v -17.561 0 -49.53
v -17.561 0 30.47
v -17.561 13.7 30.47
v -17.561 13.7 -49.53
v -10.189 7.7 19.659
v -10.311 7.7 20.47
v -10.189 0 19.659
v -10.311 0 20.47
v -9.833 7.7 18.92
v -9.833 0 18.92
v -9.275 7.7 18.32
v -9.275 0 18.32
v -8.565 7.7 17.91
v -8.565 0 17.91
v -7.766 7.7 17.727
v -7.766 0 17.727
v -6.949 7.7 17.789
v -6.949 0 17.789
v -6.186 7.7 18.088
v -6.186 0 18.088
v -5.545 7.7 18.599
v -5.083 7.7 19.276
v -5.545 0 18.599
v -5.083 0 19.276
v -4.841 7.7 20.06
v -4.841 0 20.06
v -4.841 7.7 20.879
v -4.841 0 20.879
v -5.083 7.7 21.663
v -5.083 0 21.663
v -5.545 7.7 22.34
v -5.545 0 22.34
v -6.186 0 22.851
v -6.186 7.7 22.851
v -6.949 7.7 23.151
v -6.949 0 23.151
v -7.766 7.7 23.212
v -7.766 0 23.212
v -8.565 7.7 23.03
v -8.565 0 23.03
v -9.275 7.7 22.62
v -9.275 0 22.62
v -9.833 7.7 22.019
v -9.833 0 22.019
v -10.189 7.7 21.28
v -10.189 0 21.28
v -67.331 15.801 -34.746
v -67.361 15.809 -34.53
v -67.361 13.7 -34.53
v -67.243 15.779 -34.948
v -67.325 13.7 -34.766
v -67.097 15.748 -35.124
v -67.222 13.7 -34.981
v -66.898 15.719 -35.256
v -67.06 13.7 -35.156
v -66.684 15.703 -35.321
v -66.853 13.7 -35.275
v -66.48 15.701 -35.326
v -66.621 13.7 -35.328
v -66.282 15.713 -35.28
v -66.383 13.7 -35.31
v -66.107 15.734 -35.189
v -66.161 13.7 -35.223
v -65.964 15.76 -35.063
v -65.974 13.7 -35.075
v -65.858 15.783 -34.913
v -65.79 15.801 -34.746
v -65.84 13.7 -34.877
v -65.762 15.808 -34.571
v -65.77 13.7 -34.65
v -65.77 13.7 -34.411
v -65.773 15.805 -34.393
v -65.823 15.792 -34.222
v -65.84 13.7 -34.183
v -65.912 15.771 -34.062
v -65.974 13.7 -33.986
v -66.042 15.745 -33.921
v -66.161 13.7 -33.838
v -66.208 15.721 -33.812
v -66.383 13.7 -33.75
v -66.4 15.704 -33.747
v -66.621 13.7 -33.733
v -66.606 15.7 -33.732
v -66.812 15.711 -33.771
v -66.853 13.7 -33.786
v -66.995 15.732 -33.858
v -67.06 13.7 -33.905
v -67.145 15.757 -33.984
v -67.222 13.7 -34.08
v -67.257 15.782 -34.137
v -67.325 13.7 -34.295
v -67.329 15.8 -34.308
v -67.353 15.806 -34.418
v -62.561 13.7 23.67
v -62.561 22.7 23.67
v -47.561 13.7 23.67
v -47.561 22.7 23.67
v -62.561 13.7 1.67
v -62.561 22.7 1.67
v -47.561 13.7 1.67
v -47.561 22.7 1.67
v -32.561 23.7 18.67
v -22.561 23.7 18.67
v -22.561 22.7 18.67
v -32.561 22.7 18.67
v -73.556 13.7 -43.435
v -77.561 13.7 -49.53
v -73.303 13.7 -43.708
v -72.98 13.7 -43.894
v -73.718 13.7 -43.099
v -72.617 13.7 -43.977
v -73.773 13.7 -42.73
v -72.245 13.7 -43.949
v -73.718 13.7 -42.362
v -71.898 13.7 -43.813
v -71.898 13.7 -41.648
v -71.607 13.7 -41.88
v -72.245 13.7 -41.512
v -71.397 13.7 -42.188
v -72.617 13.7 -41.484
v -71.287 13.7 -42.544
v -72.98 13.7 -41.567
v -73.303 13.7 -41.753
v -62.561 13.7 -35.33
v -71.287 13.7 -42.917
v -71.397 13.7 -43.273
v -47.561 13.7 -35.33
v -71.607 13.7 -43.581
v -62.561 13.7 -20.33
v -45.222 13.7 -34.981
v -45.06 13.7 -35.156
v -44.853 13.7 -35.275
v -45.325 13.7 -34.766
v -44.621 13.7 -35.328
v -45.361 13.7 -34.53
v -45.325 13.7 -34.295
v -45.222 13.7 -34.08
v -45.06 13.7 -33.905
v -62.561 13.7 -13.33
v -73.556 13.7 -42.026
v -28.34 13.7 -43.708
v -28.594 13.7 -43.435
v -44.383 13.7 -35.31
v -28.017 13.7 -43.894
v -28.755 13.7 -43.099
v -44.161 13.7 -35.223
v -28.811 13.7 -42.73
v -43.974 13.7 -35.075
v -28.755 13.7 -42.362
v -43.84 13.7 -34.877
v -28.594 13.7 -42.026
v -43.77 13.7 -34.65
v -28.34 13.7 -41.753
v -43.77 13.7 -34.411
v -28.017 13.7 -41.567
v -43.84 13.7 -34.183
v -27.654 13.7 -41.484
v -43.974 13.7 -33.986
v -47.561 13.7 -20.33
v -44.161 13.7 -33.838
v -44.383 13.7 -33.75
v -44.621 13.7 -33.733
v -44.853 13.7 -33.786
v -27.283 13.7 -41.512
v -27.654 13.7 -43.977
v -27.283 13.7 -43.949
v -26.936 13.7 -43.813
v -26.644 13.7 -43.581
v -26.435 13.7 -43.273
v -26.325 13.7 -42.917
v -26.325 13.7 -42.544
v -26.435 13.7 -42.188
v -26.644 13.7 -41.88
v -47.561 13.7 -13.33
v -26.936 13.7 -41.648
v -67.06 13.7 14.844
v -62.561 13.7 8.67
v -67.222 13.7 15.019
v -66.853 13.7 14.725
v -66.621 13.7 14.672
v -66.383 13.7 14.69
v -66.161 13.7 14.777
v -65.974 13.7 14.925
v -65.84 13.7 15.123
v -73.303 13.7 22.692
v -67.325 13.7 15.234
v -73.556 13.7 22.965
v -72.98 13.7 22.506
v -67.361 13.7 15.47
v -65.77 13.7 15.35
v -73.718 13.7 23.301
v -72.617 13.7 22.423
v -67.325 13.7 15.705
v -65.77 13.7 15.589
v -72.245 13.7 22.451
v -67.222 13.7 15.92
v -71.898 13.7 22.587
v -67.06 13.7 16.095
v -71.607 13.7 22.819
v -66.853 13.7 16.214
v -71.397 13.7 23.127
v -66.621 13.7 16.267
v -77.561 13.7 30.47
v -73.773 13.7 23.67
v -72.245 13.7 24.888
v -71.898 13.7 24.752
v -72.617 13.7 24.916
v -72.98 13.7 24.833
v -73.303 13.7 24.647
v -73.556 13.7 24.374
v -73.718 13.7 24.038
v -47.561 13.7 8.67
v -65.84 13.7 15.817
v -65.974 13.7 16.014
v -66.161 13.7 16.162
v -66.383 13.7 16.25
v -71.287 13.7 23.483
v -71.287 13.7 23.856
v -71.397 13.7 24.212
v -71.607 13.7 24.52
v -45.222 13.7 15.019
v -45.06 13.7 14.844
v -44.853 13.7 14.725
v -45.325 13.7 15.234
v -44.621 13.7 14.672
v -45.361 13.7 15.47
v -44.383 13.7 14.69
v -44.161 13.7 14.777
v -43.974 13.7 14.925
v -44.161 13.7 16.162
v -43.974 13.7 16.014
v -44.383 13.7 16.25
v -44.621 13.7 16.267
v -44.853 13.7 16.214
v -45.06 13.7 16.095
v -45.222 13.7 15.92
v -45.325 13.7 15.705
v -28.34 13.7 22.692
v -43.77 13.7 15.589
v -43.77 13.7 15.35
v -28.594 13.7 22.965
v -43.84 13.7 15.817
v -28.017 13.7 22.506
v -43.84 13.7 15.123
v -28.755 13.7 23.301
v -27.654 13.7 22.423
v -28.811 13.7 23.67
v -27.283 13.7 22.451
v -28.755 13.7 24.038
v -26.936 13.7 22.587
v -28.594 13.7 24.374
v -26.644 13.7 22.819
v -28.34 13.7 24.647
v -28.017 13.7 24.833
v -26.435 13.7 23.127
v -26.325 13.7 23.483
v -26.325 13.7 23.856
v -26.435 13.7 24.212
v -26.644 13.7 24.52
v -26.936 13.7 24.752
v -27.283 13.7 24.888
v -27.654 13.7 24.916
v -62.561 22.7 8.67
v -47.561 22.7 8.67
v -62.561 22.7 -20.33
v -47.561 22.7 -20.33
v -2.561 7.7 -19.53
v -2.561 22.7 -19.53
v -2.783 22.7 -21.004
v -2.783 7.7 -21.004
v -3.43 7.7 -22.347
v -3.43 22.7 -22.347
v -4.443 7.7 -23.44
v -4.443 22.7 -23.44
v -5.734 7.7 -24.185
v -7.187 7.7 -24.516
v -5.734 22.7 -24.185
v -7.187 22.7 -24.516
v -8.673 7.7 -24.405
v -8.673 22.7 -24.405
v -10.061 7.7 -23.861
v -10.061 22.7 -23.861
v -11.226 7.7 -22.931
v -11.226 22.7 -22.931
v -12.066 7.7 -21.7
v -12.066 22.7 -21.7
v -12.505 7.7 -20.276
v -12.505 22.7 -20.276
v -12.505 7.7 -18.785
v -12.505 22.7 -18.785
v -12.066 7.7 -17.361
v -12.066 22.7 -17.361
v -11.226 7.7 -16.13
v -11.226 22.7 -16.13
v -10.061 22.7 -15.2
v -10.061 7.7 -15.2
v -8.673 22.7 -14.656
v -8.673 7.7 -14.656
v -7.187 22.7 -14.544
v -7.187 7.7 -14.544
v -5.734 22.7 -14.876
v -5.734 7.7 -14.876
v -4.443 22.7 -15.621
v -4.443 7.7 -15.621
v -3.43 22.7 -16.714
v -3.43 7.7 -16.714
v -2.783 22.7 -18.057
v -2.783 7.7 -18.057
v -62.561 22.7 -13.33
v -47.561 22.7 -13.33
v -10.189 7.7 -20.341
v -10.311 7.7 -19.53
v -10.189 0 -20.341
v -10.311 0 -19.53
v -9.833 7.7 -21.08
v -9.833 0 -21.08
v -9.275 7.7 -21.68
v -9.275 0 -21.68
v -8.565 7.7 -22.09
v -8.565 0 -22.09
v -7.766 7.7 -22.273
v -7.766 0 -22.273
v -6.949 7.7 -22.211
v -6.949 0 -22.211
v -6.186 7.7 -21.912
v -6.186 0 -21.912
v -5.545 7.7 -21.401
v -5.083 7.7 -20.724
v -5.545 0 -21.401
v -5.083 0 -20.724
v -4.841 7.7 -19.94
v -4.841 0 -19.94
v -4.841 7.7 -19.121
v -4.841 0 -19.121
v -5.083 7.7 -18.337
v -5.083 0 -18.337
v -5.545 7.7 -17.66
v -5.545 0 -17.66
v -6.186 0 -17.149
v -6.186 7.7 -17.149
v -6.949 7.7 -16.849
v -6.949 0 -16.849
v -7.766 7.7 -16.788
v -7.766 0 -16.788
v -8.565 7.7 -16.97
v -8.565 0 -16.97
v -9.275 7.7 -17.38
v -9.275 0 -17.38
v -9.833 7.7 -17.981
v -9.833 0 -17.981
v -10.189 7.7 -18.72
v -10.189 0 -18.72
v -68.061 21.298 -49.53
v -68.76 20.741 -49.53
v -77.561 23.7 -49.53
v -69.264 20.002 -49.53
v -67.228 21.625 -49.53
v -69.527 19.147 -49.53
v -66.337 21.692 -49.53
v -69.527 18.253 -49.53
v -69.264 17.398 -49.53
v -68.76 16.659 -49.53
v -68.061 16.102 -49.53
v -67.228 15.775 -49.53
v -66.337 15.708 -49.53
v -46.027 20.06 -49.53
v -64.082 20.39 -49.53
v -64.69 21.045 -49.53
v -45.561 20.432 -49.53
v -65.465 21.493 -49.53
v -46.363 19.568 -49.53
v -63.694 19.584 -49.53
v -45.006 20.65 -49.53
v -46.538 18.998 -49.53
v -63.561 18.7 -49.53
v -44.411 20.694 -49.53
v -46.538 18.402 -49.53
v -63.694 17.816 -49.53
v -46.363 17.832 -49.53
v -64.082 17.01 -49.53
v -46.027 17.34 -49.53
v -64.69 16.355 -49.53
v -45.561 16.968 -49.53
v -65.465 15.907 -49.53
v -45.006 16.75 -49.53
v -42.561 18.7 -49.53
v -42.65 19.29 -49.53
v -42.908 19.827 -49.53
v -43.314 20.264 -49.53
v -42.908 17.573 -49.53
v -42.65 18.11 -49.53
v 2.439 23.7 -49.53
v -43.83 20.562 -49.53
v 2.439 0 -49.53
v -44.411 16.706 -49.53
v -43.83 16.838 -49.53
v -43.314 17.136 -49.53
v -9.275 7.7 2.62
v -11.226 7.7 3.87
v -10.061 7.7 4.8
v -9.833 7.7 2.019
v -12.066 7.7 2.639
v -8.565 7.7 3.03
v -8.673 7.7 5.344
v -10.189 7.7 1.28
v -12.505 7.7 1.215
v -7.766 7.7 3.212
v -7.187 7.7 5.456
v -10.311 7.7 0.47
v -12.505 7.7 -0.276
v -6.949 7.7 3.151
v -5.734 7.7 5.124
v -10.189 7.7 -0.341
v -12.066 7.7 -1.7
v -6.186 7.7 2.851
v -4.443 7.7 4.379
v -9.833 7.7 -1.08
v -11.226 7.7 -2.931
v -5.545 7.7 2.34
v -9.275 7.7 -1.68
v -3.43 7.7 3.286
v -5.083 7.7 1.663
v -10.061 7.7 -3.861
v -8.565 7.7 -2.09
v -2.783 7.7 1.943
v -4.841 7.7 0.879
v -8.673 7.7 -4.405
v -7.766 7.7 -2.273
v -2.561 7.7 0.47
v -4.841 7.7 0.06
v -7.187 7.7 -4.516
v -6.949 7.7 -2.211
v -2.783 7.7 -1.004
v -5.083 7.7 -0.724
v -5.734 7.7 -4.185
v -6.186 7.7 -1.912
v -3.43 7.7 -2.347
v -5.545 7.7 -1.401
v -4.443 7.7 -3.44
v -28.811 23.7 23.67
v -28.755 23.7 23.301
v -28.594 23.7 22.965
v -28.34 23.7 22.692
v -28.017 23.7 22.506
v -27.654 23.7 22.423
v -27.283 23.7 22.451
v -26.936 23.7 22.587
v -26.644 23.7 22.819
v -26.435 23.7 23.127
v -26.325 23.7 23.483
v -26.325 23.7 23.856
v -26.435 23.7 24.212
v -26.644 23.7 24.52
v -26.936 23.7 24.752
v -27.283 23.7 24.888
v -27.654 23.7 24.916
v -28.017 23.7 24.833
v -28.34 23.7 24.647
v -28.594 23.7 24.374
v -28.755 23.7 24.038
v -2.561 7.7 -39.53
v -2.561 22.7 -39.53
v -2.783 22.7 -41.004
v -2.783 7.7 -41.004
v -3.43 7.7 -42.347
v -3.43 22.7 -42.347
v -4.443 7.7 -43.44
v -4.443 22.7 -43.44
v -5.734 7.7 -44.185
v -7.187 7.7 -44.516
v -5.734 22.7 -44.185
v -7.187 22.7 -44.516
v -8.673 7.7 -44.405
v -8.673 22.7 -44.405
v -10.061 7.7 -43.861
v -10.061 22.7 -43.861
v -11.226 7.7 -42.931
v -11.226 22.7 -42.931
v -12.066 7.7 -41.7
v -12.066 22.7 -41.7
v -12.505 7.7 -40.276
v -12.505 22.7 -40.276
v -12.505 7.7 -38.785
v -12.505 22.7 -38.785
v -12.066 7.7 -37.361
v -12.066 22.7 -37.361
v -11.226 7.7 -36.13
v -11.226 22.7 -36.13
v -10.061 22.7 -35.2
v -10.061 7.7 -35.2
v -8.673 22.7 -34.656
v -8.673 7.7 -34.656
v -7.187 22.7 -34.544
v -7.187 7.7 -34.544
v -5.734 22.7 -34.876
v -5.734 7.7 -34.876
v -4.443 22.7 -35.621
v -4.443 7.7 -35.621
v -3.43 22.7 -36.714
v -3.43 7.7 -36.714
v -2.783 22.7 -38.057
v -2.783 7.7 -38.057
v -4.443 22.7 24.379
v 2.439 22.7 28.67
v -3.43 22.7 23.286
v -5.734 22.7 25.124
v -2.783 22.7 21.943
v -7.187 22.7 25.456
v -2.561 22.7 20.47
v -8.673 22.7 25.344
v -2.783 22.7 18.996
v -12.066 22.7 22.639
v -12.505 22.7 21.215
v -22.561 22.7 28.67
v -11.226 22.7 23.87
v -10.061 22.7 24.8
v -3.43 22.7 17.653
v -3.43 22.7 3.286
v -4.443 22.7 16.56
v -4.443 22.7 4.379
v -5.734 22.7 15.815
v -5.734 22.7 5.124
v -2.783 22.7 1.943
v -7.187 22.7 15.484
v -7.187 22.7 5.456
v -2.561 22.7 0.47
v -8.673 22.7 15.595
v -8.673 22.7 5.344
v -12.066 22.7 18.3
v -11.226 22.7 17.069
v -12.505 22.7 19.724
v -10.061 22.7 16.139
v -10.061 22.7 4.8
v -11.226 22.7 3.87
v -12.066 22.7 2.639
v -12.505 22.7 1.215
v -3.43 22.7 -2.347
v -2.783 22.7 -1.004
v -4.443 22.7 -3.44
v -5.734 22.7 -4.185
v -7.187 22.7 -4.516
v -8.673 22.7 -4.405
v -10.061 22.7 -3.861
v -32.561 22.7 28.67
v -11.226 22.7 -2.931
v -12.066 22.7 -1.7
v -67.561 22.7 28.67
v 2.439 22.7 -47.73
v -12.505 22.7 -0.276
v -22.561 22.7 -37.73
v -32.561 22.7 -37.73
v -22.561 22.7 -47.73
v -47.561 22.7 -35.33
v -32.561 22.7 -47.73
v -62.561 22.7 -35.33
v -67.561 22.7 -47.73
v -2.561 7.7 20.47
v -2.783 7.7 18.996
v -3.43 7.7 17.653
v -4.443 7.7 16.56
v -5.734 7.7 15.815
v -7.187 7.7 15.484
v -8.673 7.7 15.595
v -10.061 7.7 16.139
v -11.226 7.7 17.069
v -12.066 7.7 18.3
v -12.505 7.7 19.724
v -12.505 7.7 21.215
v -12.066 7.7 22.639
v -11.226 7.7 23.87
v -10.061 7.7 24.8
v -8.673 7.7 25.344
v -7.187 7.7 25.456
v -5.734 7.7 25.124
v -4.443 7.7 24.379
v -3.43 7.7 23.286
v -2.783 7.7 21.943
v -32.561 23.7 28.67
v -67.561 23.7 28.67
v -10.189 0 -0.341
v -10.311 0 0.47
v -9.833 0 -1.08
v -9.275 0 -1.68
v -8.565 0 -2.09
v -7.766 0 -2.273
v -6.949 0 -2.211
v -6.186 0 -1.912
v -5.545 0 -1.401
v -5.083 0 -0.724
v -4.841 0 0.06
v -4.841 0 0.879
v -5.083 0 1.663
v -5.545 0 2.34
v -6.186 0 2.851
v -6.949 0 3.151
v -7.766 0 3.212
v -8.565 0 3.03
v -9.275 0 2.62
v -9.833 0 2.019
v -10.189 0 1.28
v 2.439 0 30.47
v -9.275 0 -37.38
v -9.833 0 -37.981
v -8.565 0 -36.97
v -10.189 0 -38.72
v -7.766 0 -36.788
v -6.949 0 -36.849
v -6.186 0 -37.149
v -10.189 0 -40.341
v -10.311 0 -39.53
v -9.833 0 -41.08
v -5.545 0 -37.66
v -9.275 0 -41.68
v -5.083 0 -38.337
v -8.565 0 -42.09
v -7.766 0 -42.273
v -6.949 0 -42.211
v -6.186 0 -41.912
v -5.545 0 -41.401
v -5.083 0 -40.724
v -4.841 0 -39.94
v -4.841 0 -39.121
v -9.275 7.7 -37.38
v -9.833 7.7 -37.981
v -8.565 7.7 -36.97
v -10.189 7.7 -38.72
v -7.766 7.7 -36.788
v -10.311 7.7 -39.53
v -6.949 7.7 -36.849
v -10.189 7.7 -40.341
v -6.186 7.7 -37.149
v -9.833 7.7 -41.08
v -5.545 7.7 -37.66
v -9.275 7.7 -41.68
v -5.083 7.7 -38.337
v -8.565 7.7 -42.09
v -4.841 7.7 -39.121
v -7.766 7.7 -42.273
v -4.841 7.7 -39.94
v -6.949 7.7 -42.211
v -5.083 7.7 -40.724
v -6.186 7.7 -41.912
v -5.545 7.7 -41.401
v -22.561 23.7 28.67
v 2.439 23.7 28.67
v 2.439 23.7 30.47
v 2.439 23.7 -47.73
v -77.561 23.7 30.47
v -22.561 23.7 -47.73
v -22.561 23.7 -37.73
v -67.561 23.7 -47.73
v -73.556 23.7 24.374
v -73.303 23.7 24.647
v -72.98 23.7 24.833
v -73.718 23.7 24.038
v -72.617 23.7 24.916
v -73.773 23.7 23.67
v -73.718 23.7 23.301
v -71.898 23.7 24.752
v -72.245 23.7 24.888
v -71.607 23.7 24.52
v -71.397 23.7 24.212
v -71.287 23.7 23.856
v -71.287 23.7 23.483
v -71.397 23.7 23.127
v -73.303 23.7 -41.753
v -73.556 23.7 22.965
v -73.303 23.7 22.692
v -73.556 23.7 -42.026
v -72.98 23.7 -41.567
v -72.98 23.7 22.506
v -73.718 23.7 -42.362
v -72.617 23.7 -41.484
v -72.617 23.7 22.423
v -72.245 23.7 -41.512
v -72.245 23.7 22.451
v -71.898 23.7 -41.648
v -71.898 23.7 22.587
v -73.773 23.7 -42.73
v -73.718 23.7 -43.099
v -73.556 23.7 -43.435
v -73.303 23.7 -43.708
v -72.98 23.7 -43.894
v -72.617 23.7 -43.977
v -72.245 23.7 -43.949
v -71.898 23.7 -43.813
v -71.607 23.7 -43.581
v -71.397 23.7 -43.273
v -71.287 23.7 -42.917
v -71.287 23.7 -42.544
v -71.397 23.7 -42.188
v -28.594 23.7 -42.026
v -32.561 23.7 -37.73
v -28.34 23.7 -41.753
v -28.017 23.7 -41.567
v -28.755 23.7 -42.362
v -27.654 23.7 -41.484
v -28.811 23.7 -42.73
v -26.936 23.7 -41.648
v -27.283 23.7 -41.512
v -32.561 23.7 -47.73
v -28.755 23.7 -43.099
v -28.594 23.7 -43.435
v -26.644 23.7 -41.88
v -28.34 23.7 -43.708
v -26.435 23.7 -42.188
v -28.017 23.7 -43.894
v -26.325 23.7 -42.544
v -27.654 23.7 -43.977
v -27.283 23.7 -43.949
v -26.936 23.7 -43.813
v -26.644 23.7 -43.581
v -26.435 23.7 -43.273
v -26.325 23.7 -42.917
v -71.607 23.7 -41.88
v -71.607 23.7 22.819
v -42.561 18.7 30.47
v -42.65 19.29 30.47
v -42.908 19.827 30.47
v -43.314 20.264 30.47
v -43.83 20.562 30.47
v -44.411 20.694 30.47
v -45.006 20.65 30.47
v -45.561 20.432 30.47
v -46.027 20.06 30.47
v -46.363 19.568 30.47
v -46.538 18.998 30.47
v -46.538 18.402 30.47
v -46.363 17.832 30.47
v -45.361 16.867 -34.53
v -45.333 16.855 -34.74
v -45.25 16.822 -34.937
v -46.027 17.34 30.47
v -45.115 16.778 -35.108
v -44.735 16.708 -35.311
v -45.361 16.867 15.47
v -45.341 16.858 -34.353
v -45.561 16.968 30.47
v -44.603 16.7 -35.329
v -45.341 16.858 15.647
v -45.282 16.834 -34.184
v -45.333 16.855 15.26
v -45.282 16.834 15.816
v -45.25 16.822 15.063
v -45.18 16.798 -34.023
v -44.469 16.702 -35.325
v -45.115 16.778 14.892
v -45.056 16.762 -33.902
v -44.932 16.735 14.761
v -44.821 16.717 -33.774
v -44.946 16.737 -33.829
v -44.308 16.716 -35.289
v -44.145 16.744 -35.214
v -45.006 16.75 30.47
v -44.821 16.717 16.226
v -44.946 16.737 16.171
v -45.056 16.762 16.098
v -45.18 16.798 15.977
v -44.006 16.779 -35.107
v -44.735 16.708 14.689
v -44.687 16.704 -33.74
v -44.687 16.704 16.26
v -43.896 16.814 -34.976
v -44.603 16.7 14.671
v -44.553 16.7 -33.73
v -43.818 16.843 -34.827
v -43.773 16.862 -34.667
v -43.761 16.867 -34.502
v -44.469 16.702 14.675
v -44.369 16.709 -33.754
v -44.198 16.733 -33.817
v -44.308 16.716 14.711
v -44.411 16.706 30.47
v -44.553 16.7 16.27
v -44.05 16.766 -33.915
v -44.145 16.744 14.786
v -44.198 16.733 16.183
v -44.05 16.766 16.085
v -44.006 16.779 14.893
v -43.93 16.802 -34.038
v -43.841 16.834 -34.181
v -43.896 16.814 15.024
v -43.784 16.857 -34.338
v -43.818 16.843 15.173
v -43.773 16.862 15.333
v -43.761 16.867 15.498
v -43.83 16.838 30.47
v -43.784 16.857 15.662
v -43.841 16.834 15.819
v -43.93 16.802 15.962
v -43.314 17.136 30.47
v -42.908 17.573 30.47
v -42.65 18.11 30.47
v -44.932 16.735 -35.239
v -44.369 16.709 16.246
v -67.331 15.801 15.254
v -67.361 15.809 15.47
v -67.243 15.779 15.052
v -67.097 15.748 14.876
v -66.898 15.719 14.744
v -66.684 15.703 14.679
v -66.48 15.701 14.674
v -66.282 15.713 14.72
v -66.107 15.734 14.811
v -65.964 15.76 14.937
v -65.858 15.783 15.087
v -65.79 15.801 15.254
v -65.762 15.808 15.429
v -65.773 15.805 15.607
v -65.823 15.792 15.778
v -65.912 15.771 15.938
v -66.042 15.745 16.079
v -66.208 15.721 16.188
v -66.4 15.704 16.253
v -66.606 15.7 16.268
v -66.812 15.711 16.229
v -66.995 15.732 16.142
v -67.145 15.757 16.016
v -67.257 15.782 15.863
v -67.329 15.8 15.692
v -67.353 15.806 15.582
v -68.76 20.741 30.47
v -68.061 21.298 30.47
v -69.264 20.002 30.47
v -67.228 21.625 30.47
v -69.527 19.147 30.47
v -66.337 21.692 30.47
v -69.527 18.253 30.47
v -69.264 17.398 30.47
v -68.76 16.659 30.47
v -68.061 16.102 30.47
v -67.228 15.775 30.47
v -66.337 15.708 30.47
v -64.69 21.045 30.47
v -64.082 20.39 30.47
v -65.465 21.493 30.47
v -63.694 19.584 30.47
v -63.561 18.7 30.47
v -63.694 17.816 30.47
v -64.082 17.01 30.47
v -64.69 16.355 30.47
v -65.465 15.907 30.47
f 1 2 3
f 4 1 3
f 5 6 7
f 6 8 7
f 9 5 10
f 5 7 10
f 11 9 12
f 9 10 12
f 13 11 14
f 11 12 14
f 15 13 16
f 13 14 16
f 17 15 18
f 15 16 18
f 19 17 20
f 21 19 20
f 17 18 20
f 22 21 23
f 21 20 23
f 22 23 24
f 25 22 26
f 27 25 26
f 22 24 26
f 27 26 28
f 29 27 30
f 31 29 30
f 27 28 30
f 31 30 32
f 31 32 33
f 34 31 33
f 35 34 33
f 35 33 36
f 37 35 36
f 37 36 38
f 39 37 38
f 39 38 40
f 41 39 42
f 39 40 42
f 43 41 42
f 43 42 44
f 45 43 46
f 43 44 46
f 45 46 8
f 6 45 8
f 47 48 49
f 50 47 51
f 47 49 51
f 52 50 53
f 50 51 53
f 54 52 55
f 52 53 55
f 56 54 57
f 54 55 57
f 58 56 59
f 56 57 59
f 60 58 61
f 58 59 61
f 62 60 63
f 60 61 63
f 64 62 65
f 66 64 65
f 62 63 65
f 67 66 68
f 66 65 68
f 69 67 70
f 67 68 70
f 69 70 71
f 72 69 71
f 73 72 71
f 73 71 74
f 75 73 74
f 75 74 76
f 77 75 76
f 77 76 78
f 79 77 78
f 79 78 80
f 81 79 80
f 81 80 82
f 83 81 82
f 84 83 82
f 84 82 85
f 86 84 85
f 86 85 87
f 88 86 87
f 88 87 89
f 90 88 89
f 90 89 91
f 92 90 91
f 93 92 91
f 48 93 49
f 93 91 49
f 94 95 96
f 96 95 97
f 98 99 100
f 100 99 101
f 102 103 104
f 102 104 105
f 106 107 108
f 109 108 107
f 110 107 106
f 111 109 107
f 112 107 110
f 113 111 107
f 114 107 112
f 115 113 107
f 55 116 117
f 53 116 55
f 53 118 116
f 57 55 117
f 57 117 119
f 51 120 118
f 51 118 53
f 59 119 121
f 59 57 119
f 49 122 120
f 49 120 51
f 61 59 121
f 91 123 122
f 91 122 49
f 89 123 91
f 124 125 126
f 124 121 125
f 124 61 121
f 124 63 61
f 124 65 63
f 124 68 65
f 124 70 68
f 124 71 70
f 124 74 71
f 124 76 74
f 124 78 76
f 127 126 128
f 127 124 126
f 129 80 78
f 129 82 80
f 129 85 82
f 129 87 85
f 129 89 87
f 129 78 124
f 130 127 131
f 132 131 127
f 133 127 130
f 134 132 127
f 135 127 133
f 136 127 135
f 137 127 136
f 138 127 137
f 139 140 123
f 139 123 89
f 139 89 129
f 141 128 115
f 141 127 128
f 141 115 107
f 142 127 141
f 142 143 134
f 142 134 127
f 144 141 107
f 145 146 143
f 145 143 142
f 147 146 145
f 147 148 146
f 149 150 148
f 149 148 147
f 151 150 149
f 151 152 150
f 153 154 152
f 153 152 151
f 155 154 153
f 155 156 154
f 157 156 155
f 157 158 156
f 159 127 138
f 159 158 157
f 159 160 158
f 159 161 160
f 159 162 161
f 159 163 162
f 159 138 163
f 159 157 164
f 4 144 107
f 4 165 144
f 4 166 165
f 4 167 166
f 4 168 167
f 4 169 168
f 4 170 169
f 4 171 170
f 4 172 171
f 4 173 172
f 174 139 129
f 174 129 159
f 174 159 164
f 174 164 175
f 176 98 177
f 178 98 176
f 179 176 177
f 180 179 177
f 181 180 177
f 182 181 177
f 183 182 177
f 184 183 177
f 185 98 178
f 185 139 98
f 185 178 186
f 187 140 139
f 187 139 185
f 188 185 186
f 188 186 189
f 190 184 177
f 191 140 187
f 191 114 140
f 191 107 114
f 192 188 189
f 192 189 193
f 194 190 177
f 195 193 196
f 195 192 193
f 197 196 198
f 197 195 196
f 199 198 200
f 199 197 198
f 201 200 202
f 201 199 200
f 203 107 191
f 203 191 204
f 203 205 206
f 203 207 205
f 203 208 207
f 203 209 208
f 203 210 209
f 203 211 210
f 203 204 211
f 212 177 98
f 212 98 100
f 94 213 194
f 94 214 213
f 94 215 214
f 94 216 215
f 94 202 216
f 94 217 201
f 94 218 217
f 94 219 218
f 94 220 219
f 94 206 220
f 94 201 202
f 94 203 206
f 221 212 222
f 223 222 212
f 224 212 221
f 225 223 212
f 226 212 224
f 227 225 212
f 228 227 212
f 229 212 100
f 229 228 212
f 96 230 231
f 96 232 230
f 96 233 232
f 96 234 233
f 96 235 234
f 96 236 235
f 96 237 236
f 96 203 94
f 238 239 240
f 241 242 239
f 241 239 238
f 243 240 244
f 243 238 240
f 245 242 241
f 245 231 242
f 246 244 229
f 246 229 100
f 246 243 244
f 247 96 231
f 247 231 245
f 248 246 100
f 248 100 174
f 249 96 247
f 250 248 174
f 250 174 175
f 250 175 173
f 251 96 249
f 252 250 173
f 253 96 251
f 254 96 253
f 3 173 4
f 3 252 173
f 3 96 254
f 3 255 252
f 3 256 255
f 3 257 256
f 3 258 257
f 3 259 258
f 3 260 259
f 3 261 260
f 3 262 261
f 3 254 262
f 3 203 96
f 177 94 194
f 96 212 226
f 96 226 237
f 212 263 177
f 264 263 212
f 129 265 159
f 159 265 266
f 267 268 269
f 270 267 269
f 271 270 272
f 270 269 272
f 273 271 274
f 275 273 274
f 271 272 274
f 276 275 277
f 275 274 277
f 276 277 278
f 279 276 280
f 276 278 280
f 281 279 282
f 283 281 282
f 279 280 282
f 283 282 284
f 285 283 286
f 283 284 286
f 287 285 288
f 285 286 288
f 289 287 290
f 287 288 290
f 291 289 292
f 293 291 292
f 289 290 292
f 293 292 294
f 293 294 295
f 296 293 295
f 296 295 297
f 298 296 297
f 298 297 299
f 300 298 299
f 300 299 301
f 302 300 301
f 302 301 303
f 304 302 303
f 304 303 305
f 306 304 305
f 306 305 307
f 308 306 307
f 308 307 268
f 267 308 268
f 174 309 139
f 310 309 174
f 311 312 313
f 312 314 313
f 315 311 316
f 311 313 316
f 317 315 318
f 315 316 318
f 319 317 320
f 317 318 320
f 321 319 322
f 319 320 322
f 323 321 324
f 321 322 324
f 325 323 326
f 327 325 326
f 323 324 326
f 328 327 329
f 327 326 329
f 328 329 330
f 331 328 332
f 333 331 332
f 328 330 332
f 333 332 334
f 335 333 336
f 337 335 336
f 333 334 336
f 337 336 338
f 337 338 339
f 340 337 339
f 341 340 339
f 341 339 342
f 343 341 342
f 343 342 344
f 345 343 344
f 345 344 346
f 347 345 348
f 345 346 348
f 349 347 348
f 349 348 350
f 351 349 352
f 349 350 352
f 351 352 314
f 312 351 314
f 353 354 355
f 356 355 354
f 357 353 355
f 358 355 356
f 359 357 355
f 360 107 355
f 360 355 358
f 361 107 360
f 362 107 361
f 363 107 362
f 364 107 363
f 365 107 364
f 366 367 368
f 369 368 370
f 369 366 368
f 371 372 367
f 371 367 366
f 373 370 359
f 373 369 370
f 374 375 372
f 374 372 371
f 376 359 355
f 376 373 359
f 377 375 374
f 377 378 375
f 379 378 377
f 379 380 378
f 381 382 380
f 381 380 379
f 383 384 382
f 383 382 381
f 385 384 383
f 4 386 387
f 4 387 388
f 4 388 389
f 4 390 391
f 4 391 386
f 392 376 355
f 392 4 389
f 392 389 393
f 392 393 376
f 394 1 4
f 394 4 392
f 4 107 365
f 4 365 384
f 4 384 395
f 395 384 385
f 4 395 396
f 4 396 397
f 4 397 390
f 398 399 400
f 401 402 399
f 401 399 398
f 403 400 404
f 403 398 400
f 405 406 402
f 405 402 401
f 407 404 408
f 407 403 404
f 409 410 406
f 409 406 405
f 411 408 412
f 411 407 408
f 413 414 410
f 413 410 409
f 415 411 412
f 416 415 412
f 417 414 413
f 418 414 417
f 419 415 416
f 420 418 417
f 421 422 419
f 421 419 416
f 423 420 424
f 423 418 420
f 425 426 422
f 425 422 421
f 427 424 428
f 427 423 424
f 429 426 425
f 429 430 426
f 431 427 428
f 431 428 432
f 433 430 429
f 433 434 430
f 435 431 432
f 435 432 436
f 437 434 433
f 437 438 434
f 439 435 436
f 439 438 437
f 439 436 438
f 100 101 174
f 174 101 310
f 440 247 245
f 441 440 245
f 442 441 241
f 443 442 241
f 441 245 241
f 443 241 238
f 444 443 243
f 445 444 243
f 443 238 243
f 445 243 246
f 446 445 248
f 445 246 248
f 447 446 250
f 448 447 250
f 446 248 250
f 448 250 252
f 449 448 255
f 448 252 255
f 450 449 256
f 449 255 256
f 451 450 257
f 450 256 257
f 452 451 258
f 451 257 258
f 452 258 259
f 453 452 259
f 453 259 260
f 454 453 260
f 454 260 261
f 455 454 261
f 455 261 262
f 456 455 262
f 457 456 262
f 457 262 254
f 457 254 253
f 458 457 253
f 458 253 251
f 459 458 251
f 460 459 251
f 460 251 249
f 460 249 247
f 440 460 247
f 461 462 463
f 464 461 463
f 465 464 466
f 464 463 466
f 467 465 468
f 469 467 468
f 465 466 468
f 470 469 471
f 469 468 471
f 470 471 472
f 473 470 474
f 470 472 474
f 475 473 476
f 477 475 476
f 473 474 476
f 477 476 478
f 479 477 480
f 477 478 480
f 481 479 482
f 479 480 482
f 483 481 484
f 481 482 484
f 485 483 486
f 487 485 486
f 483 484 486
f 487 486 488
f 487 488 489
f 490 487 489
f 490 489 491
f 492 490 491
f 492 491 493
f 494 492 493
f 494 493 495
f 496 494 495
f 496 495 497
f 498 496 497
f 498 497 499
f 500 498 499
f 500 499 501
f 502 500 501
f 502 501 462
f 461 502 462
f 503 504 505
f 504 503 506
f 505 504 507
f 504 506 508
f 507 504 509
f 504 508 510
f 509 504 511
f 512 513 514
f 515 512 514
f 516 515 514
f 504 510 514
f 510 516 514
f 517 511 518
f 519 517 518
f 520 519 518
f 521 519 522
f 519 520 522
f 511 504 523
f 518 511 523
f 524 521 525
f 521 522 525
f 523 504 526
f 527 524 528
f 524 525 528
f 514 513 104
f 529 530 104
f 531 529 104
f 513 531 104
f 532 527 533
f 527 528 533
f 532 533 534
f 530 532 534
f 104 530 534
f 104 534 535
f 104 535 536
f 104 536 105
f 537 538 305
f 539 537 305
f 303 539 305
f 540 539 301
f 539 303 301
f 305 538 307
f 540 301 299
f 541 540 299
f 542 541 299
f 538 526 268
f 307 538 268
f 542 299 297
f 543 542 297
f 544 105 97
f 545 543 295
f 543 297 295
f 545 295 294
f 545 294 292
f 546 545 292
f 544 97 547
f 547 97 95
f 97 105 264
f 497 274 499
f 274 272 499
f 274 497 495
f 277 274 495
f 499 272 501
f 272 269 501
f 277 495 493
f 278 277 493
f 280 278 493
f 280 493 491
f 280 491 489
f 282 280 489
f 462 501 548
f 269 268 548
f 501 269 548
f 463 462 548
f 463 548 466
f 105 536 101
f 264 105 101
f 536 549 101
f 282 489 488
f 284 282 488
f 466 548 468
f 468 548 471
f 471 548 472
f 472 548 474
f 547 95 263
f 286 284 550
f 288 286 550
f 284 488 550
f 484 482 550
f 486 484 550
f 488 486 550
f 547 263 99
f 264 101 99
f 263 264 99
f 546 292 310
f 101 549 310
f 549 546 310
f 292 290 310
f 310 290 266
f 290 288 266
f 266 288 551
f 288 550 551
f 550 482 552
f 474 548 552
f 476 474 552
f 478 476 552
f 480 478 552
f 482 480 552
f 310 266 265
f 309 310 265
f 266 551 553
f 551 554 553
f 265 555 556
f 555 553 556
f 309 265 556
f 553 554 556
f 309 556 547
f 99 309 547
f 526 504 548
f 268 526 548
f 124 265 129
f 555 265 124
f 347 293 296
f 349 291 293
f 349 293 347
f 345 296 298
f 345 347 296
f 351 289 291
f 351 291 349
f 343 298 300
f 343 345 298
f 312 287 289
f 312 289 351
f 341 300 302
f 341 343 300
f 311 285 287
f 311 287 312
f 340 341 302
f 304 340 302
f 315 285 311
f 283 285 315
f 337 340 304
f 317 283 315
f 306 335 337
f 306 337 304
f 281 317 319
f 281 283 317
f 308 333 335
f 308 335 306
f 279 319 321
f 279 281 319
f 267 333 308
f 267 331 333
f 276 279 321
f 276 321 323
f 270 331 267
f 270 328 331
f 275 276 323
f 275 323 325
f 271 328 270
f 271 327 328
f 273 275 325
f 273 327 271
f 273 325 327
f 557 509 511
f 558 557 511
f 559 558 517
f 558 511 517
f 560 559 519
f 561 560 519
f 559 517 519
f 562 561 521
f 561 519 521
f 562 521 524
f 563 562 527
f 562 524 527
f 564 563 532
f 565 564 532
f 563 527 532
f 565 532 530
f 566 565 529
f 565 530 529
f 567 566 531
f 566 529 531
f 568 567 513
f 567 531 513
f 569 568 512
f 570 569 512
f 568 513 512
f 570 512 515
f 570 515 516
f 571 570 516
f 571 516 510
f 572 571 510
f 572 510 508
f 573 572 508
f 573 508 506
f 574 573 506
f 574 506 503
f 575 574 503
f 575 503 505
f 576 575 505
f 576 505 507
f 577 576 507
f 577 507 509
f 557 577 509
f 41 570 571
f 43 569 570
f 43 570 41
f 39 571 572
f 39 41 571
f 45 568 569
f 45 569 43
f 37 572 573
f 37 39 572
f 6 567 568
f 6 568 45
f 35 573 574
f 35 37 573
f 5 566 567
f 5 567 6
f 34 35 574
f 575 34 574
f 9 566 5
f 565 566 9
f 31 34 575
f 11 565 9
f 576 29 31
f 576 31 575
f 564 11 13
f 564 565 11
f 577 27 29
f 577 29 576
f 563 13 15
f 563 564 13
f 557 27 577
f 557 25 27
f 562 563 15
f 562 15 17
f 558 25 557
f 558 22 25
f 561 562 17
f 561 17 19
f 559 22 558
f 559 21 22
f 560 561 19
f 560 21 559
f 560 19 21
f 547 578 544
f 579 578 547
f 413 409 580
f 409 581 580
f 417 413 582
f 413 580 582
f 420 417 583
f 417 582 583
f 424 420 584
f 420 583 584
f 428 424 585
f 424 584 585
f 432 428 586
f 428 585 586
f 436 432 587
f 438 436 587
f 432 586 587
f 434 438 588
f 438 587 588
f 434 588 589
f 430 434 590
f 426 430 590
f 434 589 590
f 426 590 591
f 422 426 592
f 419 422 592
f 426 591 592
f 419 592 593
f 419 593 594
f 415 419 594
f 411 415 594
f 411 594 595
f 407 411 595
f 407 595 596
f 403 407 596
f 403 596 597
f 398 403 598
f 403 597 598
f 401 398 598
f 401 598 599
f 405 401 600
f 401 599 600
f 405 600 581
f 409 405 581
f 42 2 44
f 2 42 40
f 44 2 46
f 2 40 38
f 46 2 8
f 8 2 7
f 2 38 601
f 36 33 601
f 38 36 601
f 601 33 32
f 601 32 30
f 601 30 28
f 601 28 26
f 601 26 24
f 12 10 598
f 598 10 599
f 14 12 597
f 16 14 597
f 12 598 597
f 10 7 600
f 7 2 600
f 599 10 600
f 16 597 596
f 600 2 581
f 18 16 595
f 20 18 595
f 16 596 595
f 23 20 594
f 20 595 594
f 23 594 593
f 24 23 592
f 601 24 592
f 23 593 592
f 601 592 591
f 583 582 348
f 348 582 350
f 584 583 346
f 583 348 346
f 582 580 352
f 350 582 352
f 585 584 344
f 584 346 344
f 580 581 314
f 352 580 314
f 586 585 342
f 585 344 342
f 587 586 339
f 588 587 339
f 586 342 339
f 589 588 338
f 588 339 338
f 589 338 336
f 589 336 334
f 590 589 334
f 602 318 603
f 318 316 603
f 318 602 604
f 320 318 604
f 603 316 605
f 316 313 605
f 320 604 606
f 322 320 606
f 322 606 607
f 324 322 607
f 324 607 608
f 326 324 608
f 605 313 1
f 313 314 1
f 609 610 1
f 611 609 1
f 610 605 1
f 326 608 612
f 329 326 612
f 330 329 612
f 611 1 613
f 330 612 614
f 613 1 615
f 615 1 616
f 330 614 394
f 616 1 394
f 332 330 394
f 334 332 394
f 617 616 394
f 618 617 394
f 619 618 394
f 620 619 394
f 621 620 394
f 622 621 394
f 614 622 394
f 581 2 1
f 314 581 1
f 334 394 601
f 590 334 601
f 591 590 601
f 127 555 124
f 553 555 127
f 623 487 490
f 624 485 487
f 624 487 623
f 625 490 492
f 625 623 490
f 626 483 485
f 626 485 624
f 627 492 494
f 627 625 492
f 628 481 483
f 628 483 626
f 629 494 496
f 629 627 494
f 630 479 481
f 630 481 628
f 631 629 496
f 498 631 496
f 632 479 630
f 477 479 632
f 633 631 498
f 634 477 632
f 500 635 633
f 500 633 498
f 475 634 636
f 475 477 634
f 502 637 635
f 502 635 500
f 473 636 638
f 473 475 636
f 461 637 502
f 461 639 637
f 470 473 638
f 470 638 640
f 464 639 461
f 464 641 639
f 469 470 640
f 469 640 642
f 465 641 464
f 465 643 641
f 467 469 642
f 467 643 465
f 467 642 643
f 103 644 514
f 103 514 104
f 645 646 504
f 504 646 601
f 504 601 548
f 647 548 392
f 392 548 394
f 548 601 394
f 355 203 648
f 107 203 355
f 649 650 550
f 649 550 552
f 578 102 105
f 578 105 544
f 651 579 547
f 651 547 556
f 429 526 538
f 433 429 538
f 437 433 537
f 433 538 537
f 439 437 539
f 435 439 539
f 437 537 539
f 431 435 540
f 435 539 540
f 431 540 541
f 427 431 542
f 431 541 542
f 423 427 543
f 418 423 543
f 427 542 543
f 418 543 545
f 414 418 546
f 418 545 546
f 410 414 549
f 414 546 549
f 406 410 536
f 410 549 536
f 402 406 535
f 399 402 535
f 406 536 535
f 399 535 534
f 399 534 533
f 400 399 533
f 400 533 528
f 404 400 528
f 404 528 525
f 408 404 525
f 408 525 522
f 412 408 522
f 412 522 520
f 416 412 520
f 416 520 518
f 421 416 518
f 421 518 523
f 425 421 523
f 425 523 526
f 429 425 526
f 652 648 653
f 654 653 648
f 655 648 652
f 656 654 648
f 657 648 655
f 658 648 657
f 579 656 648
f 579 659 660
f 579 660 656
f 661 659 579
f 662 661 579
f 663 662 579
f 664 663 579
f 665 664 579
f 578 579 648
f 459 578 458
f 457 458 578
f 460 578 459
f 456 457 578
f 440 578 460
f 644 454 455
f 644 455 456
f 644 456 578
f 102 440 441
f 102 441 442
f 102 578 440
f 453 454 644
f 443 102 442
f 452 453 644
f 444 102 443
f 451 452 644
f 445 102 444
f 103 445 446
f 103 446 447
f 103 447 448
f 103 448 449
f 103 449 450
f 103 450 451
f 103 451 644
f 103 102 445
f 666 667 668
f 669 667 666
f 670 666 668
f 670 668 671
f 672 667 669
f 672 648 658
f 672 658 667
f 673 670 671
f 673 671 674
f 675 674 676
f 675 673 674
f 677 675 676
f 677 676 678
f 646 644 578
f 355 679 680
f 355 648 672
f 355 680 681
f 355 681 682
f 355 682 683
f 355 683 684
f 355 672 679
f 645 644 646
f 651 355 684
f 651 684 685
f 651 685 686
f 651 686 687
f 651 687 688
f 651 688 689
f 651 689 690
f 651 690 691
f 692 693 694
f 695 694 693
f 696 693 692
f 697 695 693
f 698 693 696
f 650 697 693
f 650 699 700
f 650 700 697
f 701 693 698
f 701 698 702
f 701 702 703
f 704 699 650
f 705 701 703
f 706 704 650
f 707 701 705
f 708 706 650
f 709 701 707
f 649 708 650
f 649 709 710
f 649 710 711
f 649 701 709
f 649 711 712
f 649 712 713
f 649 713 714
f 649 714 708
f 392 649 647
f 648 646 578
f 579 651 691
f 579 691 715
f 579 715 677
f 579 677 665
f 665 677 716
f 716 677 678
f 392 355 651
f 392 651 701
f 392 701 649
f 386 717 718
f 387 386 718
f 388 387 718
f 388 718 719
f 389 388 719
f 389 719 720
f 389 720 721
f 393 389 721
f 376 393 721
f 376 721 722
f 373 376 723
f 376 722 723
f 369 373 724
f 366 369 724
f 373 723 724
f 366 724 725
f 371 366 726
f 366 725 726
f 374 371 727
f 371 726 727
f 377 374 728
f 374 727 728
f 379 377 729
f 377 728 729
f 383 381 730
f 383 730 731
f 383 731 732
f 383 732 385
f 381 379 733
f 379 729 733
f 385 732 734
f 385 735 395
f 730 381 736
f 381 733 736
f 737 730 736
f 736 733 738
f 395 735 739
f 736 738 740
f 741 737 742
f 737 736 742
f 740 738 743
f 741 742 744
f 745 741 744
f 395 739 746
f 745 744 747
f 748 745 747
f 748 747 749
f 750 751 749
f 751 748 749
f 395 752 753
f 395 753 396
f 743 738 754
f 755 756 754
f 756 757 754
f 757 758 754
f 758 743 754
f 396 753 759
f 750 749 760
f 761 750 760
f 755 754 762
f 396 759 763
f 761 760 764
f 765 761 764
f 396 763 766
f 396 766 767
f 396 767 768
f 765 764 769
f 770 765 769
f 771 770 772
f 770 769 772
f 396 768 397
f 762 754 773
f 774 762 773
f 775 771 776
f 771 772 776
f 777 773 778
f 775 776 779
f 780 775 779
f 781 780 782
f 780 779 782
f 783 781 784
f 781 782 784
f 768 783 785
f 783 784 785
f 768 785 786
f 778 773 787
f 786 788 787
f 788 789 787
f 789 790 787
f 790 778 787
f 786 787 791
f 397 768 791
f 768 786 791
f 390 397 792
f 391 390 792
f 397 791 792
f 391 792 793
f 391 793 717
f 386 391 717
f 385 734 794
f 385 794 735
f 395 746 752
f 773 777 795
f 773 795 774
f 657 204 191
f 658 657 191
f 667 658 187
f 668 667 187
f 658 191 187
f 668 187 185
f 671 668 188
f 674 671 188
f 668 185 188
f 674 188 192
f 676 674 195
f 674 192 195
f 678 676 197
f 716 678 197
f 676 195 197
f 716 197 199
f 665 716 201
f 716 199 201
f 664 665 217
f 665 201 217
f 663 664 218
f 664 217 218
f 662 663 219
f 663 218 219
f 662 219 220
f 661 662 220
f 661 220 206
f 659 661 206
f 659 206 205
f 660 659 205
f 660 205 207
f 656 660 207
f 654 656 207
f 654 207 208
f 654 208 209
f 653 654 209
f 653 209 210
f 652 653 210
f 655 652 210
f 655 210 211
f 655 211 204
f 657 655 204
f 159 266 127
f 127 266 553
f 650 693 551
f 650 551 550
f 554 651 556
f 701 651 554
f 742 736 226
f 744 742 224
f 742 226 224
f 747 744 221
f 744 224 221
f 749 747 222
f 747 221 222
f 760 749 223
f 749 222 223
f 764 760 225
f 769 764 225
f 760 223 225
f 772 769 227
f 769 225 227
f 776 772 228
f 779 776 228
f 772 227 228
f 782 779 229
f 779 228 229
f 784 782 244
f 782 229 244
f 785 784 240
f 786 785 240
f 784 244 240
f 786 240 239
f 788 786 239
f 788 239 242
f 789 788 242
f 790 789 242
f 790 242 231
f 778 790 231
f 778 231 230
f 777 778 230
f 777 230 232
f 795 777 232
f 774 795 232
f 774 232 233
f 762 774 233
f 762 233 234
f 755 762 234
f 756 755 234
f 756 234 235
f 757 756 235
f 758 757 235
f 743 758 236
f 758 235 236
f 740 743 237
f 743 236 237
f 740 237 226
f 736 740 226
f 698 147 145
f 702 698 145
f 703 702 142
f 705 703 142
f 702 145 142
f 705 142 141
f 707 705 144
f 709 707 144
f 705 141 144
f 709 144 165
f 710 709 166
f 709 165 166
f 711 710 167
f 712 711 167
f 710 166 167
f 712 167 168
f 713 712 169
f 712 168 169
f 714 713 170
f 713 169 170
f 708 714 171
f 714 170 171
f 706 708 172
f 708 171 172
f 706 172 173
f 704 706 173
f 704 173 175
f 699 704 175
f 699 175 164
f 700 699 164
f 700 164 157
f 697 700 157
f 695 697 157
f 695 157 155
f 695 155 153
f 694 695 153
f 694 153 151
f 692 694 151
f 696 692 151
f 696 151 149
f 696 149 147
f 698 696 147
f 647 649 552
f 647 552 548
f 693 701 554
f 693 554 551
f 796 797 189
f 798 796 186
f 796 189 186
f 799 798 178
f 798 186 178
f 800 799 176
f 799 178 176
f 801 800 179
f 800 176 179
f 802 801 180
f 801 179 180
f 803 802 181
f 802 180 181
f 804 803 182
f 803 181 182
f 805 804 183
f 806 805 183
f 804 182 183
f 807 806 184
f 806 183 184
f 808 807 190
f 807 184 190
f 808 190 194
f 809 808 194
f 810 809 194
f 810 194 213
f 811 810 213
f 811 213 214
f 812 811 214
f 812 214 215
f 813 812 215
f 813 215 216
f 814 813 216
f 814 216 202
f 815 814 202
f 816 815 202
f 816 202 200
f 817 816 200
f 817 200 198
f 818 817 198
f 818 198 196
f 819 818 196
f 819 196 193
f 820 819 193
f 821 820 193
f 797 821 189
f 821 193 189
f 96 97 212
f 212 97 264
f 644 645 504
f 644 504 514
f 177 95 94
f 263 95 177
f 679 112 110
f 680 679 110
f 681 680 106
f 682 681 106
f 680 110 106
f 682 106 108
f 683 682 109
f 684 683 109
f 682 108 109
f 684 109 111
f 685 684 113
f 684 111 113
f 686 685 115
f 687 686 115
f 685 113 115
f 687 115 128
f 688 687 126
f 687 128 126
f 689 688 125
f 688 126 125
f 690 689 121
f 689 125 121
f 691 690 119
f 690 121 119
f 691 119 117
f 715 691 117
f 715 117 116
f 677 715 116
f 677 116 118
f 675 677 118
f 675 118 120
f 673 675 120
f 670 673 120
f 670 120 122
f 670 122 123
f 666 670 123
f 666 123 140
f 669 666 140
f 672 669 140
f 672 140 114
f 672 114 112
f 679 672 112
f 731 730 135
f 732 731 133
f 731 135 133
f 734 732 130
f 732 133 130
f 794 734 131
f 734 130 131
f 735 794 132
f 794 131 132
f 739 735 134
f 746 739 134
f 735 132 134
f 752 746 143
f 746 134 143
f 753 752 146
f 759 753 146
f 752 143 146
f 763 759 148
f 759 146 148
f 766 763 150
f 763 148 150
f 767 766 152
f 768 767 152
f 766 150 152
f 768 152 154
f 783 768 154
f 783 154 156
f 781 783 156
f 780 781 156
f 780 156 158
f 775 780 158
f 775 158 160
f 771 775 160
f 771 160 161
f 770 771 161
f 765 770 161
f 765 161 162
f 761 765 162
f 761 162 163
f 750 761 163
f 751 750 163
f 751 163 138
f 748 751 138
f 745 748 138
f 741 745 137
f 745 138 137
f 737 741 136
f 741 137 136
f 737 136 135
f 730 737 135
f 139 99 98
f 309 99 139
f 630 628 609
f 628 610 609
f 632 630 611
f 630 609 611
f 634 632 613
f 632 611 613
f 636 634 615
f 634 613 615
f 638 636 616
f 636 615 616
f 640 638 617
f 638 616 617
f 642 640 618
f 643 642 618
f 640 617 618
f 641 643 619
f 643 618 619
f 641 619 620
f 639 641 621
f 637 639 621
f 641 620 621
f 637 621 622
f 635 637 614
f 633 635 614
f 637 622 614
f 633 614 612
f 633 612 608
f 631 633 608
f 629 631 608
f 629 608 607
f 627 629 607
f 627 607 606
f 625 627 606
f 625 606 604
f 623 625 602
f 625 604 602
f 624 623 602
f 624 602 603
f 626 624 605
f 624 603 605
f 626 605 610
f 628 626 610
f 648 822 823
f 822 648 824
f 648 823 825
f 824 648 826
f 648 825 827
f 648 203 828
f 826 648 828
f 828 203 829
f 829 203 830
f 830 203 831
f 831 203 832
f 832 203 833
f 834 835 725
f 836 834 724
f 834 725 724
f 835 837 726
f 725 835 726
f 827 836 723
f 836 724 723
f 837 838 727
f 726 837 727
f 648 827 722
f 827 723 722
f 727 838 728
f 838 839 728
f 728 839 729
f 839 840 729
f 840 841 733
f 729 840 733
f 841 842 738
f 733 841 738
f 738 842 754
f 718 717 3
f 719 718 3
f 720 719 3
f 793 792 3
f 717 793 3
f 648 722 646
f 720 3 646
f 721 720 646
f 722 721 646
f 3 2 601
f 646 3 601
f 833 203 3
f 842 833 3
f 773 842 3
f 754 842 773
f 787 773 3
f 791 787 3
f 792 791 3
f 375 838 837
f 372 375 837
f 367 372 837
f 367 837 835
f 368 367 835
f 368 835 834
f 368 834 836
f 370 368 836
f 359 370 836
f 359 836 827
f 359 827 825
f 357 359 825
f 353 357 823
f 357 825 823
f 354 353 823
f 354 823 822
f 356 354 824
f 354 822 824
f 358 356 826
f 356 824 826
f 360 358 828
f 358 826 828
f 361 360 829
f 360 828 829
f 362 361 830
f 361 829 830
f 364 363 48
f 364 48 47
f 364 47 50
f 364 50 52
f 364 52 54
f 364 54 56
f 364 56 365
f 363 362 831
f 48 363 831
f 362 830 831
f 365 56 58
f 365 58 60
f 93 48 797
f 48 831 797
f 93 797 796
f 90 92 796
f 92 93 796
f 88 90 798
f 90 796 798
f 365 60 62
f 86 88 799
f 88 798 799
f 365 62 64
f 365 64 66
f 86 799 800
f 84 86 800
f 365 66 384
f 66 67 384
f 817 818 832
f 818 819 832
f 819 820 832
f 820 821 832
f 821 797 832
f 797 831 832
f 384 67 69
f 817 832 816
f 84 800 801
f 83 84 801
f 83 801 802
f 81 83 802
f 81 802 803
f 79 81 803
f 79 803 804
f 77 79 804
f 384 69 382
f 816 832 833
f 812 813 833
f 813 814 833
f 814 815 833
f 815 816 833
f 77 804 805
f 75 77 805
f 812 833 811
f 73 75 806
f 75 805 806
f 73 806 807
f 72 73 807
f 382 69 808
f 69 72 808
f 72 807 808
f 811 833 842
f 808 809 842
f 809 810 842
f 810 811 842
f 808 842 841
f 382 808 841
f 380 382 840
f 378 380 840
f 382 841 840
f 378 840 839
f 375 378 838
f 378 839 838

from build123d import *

# Parameters (mm, degrees)
SKETCH1_W                                     = 80
SKETCH1_H                                     = 80
BOSS_EXTRUDE1_DEPTH                           = 23.7
CUT_EXTRUDE1_DEPTH                            = 1
SKETCH3_W                                     = 15
SKETCH3_H                                     = 15
CUT_EXTRUDE2_DEPTH                            = 95.785112281
SKETCH4_W                                     = 60
SKETCH4_H                                     = 13.7
CUT_EXTRUDE3_DEPTH                            = 114.918214427
SKETCH5_R                                     = 3
SKETCH5_R_2                                   = 2
CUT_EXTRUDE4_DEPTH                            = 114.918214427
CBORE_FOR_M5_HEX_SOCKET_HEAD_CAP1_D           = 5.5
CBORE_FOR_M5_HEX_SOCKET_HEAD_CAP1_CBORE_D     = 10
CBORE_FOR_M5_HEX_SOCKET_HEAD_CAP1_CBORE_DEPTH = 15
M3X0_5_TAPPED_HOLE1_D                         = 2.5
M2X0_4_TAPPED_HOLE1_REACH                     = 95.041
M2X0_4_TAPPED_HOLE1_BORE_R                    = 0.8


with BuildPart() as part:
    # Sketch1 → Boss-Extrude1 (new body)
    with BuildSketch(Plane(origin=(0, 0, 0), x_dir=(1, 0, 0), z_dir=(0, 1, 0))):
        with Locations((-37.560747664, 9.530373832)):
            Rectangle(SKETCH1_W, SKETCH1_H)
    extrude(amount=BOSS_EXTRUDE1_DEPTH)

    # Sketch2 → Cut-Extrude1 (cut)
    with BuildSketch(Plane(origin=(0, 23.7, 0), x_dir=(1, 0, 0), z_dir=(0, 1, 0))):
        Polygon((2.439252336, -28.669626168), (-22.560747664, -28.669626168), (-22.560747664, -18.669626168), (-32.560747664, -18.669626168), (-32.560747664, -28.669626168), (-67.560747664, -28.669626168), (-67.560747664, 47.730373832), (-32.560747664, 47.730373832), (-32.560747664, 37.730373832), (-22.560747664, 37.730373832), (-22.560747664, 47.730373832), (2.439252336, 47.730373832), align=None)
    extrude(amount=-CUT_EXTRUDE1_DEPTH, mode=Mode.SUBTRACT)

    # Sketch3 → Cut-Extrude2 (cut, through all)
    with BuildSketch(Plane(origin=(0, 22.7, 0), x_dir=(1, 0, 0), z_dir=(0, 1, 0))):
        with Locations((-55.060747664, -16.169626168)):
            Rectangle(SKETCH3_W, SKETCH3_H)
        with Locations((-55.060747664, 5.830373832)):
            Rectangle(SKETCH3_W, SKETCH3_H)
        with Locations((-55.060747664, 27.830373832)):
            Rectangle(SKETCH3_W, SKETCH3_H)
    extrude(amount=-CUT_EXTRUDE2_DEPTH, mode=Mode.SUBTRACT)

    # Sketch4 → Cut-Extrude3 (cut, through all)
    with BuildSketch(Plane.XY.offset(30.469626168)):
        with Locations((-47.560747664, 6.85)):
            Rectangle(SKETCH4_W, SKETCH4_H)
    extrude(amount=-CUT_EXTRUDE3_DEPTH, mode=Mode.SUBTRACT)

    # Sketch5 → Cut-Extrude4 (cut, through all)
    with BuildSketch(Plane.XY.offset(30.469626168)):
        with Locations((-66.560747664, 18.7)):
            Circle(SKETCH5_R)
        with Locations((-44.560747664, 18.7)):
            Circle(SKETCH5_R_2)
    extrude(amount=-CUT_EXTRUDE4_DEPTH, mode=Mode.SUBTRACT)

    # CBORE for M5 Hex Socket Head Cap1 (through all)
    with Locations(Plane(origin=(0, 22.7, 0), x_dir=(1, 0, 0), z_dir=(0, 1, 0))):
        with Locations((-7.560747664, -20.469626168), (-7.560747664, -0.469626168), (-7.560747664, 19.530373832), (-7.560747664, 39.530373832)):
            CounterBoreHole(CBORE_FOR_M5_HEX_SOCKET_HEAD_CAP1_D / 2, CBORE_FOR_M5_HEX_SOCKET_HEAD_CAP1_CBORE_D / 2, CBORE_FOR_M5_HEX_SOCKET_HEAD_CAP1_CBORE_DEPTH)

    # M3x0.5 Tapped Hole1 (through all)
    with Locations(Plane(origin=(0, 23.7, 0), x_dir=(1, 0, 0), z_dir=(0, 1, 0))):
        with Locations((-27.560747664, -23.669626168), (-27.560747664, 42.730373832), (-72.523263375, -23.669626168), (-72.523263375, 42.730373832)):
            Hole(M3X0_5_TAPPED_HOLE1_D / 2)

    # M2x0.4 Tapped Hole1 bore → M2x0.4 Tapped Hole1 (cut, up to next)
    with BuildSketch(Plane(origin=(0, 13.7, 0), x_dir=(-1, 0, 0), z_dir=(0, -1, 0)), mode=Mode.PRIVATE) as m2x0_4_tapped_hole1_sk1:
        with Locations((66.560747664, -15.469626168)):
            Circle(M2X0_4_TAPPED_HOLE1_BORE_R)
    m2x0_4_tapped_hole1_tool1 = extrude(m2x0_4_tapped_hole1_sk1.sketch, amount=-M2X0_4_TAPPED_HOLE1_REACH, mode=Mode.PRIVATE) & part.part
    # M2x0.4 Tapped Hole1 bore → M2x0.4 Tapped Hole1 (cut, up to next)
    with BuildSketch(Plane(origin=(0, 13.7, 0), x_dir=(-1, 0, 0), z_dir=(0, -1, 0)), mode=Mode.PRIVATE) as m2x0_4_tapped_hole1_sk2:
        with Locations((44.560747664, -15.469626168)):
            Circle(M2X0_4_TAPPED_HOLE1_BORE_R)
    m2x0_4_tapped_hole1_tool2 = extrude(m2x0_4_tapped_hole1_sk2.sketch, amount=-M2X0_4_TAPPED_HOLE1_REACH, mode=Mode.PRIVATE) & part.part
    # M2x0.4 Tapped Hole1 bore → M2x0.4 Tapped Hole1 (cut, up to next)
    with BuildSketch(Plane(origin=(0, 13.7, 0), x_dir=(-1, 0, 0), z_dir=(0, -1, 0)), mode=Mode.PRIVATE) as m2x0_4_tapped_hole1_sk3:
        with Locations((66.560747664, 34.530373832)):
            Circle(M2X0_4_TAPPED_HOLE1_BORE_R)
    m2x0_4_tapped_hole1_tool3 = extrude(m2x0_4_tapped_hole1_sk3.sketch, amount=-M2X0_4_TAPPED_HOLE1_REACH, mode=Mode.PRIVATE) & part.part
    # M2x0.4 Tapped Hole1 bore → M2x0.4 Tapped Hole1 (cut, up to next)
    with BuildSketch(Plane(origin=(0, 13.7, 0), x_dir=(-1, 0, 0), z_dir=(0, -1, 0)), mode=Mode.PRIVATE) as m2x0_4_tapped_hole1_sk4:
        with Locations((44.560747664, 34.530373832)):
            Circle(M2X0_4_TAPPED_HOLE1_BORE_R)
    m2x0_4_tapped_hole1_tool4 = extrude(m2x0_4_tapped_hole1_sk4.sketch, amount=-M2X0_4_TAPPED_HOLE1_REACH, mode=Mode.PRIVATE) & part.part
    add(m2x0_4_tapped_hole1_tool1.solids().sort_by_distance((-66.560748, 13.7, 15.469626))[0], mode=Mode.SUBTRACT)
    add(m2x0_4_tapped_hole1_tool2.solids().sort_by_distance((-44.560748, 13.7, 15.469626))[0], mode=Mode.SUBTRACT)
    add(m2x0_4_tapped_hole1_tool3.solids().sort_by_distance((-66.560748, 13.7, -34.530374))[0], mode=Mode.SUBTRACT)
    add(m2x0_4_tapped_hole1_tool4.solids().sort_by_distance((-44.560748, 13.7, -34.530374))[0], mode=Mode.SUBTRACT)


solid = part.part
